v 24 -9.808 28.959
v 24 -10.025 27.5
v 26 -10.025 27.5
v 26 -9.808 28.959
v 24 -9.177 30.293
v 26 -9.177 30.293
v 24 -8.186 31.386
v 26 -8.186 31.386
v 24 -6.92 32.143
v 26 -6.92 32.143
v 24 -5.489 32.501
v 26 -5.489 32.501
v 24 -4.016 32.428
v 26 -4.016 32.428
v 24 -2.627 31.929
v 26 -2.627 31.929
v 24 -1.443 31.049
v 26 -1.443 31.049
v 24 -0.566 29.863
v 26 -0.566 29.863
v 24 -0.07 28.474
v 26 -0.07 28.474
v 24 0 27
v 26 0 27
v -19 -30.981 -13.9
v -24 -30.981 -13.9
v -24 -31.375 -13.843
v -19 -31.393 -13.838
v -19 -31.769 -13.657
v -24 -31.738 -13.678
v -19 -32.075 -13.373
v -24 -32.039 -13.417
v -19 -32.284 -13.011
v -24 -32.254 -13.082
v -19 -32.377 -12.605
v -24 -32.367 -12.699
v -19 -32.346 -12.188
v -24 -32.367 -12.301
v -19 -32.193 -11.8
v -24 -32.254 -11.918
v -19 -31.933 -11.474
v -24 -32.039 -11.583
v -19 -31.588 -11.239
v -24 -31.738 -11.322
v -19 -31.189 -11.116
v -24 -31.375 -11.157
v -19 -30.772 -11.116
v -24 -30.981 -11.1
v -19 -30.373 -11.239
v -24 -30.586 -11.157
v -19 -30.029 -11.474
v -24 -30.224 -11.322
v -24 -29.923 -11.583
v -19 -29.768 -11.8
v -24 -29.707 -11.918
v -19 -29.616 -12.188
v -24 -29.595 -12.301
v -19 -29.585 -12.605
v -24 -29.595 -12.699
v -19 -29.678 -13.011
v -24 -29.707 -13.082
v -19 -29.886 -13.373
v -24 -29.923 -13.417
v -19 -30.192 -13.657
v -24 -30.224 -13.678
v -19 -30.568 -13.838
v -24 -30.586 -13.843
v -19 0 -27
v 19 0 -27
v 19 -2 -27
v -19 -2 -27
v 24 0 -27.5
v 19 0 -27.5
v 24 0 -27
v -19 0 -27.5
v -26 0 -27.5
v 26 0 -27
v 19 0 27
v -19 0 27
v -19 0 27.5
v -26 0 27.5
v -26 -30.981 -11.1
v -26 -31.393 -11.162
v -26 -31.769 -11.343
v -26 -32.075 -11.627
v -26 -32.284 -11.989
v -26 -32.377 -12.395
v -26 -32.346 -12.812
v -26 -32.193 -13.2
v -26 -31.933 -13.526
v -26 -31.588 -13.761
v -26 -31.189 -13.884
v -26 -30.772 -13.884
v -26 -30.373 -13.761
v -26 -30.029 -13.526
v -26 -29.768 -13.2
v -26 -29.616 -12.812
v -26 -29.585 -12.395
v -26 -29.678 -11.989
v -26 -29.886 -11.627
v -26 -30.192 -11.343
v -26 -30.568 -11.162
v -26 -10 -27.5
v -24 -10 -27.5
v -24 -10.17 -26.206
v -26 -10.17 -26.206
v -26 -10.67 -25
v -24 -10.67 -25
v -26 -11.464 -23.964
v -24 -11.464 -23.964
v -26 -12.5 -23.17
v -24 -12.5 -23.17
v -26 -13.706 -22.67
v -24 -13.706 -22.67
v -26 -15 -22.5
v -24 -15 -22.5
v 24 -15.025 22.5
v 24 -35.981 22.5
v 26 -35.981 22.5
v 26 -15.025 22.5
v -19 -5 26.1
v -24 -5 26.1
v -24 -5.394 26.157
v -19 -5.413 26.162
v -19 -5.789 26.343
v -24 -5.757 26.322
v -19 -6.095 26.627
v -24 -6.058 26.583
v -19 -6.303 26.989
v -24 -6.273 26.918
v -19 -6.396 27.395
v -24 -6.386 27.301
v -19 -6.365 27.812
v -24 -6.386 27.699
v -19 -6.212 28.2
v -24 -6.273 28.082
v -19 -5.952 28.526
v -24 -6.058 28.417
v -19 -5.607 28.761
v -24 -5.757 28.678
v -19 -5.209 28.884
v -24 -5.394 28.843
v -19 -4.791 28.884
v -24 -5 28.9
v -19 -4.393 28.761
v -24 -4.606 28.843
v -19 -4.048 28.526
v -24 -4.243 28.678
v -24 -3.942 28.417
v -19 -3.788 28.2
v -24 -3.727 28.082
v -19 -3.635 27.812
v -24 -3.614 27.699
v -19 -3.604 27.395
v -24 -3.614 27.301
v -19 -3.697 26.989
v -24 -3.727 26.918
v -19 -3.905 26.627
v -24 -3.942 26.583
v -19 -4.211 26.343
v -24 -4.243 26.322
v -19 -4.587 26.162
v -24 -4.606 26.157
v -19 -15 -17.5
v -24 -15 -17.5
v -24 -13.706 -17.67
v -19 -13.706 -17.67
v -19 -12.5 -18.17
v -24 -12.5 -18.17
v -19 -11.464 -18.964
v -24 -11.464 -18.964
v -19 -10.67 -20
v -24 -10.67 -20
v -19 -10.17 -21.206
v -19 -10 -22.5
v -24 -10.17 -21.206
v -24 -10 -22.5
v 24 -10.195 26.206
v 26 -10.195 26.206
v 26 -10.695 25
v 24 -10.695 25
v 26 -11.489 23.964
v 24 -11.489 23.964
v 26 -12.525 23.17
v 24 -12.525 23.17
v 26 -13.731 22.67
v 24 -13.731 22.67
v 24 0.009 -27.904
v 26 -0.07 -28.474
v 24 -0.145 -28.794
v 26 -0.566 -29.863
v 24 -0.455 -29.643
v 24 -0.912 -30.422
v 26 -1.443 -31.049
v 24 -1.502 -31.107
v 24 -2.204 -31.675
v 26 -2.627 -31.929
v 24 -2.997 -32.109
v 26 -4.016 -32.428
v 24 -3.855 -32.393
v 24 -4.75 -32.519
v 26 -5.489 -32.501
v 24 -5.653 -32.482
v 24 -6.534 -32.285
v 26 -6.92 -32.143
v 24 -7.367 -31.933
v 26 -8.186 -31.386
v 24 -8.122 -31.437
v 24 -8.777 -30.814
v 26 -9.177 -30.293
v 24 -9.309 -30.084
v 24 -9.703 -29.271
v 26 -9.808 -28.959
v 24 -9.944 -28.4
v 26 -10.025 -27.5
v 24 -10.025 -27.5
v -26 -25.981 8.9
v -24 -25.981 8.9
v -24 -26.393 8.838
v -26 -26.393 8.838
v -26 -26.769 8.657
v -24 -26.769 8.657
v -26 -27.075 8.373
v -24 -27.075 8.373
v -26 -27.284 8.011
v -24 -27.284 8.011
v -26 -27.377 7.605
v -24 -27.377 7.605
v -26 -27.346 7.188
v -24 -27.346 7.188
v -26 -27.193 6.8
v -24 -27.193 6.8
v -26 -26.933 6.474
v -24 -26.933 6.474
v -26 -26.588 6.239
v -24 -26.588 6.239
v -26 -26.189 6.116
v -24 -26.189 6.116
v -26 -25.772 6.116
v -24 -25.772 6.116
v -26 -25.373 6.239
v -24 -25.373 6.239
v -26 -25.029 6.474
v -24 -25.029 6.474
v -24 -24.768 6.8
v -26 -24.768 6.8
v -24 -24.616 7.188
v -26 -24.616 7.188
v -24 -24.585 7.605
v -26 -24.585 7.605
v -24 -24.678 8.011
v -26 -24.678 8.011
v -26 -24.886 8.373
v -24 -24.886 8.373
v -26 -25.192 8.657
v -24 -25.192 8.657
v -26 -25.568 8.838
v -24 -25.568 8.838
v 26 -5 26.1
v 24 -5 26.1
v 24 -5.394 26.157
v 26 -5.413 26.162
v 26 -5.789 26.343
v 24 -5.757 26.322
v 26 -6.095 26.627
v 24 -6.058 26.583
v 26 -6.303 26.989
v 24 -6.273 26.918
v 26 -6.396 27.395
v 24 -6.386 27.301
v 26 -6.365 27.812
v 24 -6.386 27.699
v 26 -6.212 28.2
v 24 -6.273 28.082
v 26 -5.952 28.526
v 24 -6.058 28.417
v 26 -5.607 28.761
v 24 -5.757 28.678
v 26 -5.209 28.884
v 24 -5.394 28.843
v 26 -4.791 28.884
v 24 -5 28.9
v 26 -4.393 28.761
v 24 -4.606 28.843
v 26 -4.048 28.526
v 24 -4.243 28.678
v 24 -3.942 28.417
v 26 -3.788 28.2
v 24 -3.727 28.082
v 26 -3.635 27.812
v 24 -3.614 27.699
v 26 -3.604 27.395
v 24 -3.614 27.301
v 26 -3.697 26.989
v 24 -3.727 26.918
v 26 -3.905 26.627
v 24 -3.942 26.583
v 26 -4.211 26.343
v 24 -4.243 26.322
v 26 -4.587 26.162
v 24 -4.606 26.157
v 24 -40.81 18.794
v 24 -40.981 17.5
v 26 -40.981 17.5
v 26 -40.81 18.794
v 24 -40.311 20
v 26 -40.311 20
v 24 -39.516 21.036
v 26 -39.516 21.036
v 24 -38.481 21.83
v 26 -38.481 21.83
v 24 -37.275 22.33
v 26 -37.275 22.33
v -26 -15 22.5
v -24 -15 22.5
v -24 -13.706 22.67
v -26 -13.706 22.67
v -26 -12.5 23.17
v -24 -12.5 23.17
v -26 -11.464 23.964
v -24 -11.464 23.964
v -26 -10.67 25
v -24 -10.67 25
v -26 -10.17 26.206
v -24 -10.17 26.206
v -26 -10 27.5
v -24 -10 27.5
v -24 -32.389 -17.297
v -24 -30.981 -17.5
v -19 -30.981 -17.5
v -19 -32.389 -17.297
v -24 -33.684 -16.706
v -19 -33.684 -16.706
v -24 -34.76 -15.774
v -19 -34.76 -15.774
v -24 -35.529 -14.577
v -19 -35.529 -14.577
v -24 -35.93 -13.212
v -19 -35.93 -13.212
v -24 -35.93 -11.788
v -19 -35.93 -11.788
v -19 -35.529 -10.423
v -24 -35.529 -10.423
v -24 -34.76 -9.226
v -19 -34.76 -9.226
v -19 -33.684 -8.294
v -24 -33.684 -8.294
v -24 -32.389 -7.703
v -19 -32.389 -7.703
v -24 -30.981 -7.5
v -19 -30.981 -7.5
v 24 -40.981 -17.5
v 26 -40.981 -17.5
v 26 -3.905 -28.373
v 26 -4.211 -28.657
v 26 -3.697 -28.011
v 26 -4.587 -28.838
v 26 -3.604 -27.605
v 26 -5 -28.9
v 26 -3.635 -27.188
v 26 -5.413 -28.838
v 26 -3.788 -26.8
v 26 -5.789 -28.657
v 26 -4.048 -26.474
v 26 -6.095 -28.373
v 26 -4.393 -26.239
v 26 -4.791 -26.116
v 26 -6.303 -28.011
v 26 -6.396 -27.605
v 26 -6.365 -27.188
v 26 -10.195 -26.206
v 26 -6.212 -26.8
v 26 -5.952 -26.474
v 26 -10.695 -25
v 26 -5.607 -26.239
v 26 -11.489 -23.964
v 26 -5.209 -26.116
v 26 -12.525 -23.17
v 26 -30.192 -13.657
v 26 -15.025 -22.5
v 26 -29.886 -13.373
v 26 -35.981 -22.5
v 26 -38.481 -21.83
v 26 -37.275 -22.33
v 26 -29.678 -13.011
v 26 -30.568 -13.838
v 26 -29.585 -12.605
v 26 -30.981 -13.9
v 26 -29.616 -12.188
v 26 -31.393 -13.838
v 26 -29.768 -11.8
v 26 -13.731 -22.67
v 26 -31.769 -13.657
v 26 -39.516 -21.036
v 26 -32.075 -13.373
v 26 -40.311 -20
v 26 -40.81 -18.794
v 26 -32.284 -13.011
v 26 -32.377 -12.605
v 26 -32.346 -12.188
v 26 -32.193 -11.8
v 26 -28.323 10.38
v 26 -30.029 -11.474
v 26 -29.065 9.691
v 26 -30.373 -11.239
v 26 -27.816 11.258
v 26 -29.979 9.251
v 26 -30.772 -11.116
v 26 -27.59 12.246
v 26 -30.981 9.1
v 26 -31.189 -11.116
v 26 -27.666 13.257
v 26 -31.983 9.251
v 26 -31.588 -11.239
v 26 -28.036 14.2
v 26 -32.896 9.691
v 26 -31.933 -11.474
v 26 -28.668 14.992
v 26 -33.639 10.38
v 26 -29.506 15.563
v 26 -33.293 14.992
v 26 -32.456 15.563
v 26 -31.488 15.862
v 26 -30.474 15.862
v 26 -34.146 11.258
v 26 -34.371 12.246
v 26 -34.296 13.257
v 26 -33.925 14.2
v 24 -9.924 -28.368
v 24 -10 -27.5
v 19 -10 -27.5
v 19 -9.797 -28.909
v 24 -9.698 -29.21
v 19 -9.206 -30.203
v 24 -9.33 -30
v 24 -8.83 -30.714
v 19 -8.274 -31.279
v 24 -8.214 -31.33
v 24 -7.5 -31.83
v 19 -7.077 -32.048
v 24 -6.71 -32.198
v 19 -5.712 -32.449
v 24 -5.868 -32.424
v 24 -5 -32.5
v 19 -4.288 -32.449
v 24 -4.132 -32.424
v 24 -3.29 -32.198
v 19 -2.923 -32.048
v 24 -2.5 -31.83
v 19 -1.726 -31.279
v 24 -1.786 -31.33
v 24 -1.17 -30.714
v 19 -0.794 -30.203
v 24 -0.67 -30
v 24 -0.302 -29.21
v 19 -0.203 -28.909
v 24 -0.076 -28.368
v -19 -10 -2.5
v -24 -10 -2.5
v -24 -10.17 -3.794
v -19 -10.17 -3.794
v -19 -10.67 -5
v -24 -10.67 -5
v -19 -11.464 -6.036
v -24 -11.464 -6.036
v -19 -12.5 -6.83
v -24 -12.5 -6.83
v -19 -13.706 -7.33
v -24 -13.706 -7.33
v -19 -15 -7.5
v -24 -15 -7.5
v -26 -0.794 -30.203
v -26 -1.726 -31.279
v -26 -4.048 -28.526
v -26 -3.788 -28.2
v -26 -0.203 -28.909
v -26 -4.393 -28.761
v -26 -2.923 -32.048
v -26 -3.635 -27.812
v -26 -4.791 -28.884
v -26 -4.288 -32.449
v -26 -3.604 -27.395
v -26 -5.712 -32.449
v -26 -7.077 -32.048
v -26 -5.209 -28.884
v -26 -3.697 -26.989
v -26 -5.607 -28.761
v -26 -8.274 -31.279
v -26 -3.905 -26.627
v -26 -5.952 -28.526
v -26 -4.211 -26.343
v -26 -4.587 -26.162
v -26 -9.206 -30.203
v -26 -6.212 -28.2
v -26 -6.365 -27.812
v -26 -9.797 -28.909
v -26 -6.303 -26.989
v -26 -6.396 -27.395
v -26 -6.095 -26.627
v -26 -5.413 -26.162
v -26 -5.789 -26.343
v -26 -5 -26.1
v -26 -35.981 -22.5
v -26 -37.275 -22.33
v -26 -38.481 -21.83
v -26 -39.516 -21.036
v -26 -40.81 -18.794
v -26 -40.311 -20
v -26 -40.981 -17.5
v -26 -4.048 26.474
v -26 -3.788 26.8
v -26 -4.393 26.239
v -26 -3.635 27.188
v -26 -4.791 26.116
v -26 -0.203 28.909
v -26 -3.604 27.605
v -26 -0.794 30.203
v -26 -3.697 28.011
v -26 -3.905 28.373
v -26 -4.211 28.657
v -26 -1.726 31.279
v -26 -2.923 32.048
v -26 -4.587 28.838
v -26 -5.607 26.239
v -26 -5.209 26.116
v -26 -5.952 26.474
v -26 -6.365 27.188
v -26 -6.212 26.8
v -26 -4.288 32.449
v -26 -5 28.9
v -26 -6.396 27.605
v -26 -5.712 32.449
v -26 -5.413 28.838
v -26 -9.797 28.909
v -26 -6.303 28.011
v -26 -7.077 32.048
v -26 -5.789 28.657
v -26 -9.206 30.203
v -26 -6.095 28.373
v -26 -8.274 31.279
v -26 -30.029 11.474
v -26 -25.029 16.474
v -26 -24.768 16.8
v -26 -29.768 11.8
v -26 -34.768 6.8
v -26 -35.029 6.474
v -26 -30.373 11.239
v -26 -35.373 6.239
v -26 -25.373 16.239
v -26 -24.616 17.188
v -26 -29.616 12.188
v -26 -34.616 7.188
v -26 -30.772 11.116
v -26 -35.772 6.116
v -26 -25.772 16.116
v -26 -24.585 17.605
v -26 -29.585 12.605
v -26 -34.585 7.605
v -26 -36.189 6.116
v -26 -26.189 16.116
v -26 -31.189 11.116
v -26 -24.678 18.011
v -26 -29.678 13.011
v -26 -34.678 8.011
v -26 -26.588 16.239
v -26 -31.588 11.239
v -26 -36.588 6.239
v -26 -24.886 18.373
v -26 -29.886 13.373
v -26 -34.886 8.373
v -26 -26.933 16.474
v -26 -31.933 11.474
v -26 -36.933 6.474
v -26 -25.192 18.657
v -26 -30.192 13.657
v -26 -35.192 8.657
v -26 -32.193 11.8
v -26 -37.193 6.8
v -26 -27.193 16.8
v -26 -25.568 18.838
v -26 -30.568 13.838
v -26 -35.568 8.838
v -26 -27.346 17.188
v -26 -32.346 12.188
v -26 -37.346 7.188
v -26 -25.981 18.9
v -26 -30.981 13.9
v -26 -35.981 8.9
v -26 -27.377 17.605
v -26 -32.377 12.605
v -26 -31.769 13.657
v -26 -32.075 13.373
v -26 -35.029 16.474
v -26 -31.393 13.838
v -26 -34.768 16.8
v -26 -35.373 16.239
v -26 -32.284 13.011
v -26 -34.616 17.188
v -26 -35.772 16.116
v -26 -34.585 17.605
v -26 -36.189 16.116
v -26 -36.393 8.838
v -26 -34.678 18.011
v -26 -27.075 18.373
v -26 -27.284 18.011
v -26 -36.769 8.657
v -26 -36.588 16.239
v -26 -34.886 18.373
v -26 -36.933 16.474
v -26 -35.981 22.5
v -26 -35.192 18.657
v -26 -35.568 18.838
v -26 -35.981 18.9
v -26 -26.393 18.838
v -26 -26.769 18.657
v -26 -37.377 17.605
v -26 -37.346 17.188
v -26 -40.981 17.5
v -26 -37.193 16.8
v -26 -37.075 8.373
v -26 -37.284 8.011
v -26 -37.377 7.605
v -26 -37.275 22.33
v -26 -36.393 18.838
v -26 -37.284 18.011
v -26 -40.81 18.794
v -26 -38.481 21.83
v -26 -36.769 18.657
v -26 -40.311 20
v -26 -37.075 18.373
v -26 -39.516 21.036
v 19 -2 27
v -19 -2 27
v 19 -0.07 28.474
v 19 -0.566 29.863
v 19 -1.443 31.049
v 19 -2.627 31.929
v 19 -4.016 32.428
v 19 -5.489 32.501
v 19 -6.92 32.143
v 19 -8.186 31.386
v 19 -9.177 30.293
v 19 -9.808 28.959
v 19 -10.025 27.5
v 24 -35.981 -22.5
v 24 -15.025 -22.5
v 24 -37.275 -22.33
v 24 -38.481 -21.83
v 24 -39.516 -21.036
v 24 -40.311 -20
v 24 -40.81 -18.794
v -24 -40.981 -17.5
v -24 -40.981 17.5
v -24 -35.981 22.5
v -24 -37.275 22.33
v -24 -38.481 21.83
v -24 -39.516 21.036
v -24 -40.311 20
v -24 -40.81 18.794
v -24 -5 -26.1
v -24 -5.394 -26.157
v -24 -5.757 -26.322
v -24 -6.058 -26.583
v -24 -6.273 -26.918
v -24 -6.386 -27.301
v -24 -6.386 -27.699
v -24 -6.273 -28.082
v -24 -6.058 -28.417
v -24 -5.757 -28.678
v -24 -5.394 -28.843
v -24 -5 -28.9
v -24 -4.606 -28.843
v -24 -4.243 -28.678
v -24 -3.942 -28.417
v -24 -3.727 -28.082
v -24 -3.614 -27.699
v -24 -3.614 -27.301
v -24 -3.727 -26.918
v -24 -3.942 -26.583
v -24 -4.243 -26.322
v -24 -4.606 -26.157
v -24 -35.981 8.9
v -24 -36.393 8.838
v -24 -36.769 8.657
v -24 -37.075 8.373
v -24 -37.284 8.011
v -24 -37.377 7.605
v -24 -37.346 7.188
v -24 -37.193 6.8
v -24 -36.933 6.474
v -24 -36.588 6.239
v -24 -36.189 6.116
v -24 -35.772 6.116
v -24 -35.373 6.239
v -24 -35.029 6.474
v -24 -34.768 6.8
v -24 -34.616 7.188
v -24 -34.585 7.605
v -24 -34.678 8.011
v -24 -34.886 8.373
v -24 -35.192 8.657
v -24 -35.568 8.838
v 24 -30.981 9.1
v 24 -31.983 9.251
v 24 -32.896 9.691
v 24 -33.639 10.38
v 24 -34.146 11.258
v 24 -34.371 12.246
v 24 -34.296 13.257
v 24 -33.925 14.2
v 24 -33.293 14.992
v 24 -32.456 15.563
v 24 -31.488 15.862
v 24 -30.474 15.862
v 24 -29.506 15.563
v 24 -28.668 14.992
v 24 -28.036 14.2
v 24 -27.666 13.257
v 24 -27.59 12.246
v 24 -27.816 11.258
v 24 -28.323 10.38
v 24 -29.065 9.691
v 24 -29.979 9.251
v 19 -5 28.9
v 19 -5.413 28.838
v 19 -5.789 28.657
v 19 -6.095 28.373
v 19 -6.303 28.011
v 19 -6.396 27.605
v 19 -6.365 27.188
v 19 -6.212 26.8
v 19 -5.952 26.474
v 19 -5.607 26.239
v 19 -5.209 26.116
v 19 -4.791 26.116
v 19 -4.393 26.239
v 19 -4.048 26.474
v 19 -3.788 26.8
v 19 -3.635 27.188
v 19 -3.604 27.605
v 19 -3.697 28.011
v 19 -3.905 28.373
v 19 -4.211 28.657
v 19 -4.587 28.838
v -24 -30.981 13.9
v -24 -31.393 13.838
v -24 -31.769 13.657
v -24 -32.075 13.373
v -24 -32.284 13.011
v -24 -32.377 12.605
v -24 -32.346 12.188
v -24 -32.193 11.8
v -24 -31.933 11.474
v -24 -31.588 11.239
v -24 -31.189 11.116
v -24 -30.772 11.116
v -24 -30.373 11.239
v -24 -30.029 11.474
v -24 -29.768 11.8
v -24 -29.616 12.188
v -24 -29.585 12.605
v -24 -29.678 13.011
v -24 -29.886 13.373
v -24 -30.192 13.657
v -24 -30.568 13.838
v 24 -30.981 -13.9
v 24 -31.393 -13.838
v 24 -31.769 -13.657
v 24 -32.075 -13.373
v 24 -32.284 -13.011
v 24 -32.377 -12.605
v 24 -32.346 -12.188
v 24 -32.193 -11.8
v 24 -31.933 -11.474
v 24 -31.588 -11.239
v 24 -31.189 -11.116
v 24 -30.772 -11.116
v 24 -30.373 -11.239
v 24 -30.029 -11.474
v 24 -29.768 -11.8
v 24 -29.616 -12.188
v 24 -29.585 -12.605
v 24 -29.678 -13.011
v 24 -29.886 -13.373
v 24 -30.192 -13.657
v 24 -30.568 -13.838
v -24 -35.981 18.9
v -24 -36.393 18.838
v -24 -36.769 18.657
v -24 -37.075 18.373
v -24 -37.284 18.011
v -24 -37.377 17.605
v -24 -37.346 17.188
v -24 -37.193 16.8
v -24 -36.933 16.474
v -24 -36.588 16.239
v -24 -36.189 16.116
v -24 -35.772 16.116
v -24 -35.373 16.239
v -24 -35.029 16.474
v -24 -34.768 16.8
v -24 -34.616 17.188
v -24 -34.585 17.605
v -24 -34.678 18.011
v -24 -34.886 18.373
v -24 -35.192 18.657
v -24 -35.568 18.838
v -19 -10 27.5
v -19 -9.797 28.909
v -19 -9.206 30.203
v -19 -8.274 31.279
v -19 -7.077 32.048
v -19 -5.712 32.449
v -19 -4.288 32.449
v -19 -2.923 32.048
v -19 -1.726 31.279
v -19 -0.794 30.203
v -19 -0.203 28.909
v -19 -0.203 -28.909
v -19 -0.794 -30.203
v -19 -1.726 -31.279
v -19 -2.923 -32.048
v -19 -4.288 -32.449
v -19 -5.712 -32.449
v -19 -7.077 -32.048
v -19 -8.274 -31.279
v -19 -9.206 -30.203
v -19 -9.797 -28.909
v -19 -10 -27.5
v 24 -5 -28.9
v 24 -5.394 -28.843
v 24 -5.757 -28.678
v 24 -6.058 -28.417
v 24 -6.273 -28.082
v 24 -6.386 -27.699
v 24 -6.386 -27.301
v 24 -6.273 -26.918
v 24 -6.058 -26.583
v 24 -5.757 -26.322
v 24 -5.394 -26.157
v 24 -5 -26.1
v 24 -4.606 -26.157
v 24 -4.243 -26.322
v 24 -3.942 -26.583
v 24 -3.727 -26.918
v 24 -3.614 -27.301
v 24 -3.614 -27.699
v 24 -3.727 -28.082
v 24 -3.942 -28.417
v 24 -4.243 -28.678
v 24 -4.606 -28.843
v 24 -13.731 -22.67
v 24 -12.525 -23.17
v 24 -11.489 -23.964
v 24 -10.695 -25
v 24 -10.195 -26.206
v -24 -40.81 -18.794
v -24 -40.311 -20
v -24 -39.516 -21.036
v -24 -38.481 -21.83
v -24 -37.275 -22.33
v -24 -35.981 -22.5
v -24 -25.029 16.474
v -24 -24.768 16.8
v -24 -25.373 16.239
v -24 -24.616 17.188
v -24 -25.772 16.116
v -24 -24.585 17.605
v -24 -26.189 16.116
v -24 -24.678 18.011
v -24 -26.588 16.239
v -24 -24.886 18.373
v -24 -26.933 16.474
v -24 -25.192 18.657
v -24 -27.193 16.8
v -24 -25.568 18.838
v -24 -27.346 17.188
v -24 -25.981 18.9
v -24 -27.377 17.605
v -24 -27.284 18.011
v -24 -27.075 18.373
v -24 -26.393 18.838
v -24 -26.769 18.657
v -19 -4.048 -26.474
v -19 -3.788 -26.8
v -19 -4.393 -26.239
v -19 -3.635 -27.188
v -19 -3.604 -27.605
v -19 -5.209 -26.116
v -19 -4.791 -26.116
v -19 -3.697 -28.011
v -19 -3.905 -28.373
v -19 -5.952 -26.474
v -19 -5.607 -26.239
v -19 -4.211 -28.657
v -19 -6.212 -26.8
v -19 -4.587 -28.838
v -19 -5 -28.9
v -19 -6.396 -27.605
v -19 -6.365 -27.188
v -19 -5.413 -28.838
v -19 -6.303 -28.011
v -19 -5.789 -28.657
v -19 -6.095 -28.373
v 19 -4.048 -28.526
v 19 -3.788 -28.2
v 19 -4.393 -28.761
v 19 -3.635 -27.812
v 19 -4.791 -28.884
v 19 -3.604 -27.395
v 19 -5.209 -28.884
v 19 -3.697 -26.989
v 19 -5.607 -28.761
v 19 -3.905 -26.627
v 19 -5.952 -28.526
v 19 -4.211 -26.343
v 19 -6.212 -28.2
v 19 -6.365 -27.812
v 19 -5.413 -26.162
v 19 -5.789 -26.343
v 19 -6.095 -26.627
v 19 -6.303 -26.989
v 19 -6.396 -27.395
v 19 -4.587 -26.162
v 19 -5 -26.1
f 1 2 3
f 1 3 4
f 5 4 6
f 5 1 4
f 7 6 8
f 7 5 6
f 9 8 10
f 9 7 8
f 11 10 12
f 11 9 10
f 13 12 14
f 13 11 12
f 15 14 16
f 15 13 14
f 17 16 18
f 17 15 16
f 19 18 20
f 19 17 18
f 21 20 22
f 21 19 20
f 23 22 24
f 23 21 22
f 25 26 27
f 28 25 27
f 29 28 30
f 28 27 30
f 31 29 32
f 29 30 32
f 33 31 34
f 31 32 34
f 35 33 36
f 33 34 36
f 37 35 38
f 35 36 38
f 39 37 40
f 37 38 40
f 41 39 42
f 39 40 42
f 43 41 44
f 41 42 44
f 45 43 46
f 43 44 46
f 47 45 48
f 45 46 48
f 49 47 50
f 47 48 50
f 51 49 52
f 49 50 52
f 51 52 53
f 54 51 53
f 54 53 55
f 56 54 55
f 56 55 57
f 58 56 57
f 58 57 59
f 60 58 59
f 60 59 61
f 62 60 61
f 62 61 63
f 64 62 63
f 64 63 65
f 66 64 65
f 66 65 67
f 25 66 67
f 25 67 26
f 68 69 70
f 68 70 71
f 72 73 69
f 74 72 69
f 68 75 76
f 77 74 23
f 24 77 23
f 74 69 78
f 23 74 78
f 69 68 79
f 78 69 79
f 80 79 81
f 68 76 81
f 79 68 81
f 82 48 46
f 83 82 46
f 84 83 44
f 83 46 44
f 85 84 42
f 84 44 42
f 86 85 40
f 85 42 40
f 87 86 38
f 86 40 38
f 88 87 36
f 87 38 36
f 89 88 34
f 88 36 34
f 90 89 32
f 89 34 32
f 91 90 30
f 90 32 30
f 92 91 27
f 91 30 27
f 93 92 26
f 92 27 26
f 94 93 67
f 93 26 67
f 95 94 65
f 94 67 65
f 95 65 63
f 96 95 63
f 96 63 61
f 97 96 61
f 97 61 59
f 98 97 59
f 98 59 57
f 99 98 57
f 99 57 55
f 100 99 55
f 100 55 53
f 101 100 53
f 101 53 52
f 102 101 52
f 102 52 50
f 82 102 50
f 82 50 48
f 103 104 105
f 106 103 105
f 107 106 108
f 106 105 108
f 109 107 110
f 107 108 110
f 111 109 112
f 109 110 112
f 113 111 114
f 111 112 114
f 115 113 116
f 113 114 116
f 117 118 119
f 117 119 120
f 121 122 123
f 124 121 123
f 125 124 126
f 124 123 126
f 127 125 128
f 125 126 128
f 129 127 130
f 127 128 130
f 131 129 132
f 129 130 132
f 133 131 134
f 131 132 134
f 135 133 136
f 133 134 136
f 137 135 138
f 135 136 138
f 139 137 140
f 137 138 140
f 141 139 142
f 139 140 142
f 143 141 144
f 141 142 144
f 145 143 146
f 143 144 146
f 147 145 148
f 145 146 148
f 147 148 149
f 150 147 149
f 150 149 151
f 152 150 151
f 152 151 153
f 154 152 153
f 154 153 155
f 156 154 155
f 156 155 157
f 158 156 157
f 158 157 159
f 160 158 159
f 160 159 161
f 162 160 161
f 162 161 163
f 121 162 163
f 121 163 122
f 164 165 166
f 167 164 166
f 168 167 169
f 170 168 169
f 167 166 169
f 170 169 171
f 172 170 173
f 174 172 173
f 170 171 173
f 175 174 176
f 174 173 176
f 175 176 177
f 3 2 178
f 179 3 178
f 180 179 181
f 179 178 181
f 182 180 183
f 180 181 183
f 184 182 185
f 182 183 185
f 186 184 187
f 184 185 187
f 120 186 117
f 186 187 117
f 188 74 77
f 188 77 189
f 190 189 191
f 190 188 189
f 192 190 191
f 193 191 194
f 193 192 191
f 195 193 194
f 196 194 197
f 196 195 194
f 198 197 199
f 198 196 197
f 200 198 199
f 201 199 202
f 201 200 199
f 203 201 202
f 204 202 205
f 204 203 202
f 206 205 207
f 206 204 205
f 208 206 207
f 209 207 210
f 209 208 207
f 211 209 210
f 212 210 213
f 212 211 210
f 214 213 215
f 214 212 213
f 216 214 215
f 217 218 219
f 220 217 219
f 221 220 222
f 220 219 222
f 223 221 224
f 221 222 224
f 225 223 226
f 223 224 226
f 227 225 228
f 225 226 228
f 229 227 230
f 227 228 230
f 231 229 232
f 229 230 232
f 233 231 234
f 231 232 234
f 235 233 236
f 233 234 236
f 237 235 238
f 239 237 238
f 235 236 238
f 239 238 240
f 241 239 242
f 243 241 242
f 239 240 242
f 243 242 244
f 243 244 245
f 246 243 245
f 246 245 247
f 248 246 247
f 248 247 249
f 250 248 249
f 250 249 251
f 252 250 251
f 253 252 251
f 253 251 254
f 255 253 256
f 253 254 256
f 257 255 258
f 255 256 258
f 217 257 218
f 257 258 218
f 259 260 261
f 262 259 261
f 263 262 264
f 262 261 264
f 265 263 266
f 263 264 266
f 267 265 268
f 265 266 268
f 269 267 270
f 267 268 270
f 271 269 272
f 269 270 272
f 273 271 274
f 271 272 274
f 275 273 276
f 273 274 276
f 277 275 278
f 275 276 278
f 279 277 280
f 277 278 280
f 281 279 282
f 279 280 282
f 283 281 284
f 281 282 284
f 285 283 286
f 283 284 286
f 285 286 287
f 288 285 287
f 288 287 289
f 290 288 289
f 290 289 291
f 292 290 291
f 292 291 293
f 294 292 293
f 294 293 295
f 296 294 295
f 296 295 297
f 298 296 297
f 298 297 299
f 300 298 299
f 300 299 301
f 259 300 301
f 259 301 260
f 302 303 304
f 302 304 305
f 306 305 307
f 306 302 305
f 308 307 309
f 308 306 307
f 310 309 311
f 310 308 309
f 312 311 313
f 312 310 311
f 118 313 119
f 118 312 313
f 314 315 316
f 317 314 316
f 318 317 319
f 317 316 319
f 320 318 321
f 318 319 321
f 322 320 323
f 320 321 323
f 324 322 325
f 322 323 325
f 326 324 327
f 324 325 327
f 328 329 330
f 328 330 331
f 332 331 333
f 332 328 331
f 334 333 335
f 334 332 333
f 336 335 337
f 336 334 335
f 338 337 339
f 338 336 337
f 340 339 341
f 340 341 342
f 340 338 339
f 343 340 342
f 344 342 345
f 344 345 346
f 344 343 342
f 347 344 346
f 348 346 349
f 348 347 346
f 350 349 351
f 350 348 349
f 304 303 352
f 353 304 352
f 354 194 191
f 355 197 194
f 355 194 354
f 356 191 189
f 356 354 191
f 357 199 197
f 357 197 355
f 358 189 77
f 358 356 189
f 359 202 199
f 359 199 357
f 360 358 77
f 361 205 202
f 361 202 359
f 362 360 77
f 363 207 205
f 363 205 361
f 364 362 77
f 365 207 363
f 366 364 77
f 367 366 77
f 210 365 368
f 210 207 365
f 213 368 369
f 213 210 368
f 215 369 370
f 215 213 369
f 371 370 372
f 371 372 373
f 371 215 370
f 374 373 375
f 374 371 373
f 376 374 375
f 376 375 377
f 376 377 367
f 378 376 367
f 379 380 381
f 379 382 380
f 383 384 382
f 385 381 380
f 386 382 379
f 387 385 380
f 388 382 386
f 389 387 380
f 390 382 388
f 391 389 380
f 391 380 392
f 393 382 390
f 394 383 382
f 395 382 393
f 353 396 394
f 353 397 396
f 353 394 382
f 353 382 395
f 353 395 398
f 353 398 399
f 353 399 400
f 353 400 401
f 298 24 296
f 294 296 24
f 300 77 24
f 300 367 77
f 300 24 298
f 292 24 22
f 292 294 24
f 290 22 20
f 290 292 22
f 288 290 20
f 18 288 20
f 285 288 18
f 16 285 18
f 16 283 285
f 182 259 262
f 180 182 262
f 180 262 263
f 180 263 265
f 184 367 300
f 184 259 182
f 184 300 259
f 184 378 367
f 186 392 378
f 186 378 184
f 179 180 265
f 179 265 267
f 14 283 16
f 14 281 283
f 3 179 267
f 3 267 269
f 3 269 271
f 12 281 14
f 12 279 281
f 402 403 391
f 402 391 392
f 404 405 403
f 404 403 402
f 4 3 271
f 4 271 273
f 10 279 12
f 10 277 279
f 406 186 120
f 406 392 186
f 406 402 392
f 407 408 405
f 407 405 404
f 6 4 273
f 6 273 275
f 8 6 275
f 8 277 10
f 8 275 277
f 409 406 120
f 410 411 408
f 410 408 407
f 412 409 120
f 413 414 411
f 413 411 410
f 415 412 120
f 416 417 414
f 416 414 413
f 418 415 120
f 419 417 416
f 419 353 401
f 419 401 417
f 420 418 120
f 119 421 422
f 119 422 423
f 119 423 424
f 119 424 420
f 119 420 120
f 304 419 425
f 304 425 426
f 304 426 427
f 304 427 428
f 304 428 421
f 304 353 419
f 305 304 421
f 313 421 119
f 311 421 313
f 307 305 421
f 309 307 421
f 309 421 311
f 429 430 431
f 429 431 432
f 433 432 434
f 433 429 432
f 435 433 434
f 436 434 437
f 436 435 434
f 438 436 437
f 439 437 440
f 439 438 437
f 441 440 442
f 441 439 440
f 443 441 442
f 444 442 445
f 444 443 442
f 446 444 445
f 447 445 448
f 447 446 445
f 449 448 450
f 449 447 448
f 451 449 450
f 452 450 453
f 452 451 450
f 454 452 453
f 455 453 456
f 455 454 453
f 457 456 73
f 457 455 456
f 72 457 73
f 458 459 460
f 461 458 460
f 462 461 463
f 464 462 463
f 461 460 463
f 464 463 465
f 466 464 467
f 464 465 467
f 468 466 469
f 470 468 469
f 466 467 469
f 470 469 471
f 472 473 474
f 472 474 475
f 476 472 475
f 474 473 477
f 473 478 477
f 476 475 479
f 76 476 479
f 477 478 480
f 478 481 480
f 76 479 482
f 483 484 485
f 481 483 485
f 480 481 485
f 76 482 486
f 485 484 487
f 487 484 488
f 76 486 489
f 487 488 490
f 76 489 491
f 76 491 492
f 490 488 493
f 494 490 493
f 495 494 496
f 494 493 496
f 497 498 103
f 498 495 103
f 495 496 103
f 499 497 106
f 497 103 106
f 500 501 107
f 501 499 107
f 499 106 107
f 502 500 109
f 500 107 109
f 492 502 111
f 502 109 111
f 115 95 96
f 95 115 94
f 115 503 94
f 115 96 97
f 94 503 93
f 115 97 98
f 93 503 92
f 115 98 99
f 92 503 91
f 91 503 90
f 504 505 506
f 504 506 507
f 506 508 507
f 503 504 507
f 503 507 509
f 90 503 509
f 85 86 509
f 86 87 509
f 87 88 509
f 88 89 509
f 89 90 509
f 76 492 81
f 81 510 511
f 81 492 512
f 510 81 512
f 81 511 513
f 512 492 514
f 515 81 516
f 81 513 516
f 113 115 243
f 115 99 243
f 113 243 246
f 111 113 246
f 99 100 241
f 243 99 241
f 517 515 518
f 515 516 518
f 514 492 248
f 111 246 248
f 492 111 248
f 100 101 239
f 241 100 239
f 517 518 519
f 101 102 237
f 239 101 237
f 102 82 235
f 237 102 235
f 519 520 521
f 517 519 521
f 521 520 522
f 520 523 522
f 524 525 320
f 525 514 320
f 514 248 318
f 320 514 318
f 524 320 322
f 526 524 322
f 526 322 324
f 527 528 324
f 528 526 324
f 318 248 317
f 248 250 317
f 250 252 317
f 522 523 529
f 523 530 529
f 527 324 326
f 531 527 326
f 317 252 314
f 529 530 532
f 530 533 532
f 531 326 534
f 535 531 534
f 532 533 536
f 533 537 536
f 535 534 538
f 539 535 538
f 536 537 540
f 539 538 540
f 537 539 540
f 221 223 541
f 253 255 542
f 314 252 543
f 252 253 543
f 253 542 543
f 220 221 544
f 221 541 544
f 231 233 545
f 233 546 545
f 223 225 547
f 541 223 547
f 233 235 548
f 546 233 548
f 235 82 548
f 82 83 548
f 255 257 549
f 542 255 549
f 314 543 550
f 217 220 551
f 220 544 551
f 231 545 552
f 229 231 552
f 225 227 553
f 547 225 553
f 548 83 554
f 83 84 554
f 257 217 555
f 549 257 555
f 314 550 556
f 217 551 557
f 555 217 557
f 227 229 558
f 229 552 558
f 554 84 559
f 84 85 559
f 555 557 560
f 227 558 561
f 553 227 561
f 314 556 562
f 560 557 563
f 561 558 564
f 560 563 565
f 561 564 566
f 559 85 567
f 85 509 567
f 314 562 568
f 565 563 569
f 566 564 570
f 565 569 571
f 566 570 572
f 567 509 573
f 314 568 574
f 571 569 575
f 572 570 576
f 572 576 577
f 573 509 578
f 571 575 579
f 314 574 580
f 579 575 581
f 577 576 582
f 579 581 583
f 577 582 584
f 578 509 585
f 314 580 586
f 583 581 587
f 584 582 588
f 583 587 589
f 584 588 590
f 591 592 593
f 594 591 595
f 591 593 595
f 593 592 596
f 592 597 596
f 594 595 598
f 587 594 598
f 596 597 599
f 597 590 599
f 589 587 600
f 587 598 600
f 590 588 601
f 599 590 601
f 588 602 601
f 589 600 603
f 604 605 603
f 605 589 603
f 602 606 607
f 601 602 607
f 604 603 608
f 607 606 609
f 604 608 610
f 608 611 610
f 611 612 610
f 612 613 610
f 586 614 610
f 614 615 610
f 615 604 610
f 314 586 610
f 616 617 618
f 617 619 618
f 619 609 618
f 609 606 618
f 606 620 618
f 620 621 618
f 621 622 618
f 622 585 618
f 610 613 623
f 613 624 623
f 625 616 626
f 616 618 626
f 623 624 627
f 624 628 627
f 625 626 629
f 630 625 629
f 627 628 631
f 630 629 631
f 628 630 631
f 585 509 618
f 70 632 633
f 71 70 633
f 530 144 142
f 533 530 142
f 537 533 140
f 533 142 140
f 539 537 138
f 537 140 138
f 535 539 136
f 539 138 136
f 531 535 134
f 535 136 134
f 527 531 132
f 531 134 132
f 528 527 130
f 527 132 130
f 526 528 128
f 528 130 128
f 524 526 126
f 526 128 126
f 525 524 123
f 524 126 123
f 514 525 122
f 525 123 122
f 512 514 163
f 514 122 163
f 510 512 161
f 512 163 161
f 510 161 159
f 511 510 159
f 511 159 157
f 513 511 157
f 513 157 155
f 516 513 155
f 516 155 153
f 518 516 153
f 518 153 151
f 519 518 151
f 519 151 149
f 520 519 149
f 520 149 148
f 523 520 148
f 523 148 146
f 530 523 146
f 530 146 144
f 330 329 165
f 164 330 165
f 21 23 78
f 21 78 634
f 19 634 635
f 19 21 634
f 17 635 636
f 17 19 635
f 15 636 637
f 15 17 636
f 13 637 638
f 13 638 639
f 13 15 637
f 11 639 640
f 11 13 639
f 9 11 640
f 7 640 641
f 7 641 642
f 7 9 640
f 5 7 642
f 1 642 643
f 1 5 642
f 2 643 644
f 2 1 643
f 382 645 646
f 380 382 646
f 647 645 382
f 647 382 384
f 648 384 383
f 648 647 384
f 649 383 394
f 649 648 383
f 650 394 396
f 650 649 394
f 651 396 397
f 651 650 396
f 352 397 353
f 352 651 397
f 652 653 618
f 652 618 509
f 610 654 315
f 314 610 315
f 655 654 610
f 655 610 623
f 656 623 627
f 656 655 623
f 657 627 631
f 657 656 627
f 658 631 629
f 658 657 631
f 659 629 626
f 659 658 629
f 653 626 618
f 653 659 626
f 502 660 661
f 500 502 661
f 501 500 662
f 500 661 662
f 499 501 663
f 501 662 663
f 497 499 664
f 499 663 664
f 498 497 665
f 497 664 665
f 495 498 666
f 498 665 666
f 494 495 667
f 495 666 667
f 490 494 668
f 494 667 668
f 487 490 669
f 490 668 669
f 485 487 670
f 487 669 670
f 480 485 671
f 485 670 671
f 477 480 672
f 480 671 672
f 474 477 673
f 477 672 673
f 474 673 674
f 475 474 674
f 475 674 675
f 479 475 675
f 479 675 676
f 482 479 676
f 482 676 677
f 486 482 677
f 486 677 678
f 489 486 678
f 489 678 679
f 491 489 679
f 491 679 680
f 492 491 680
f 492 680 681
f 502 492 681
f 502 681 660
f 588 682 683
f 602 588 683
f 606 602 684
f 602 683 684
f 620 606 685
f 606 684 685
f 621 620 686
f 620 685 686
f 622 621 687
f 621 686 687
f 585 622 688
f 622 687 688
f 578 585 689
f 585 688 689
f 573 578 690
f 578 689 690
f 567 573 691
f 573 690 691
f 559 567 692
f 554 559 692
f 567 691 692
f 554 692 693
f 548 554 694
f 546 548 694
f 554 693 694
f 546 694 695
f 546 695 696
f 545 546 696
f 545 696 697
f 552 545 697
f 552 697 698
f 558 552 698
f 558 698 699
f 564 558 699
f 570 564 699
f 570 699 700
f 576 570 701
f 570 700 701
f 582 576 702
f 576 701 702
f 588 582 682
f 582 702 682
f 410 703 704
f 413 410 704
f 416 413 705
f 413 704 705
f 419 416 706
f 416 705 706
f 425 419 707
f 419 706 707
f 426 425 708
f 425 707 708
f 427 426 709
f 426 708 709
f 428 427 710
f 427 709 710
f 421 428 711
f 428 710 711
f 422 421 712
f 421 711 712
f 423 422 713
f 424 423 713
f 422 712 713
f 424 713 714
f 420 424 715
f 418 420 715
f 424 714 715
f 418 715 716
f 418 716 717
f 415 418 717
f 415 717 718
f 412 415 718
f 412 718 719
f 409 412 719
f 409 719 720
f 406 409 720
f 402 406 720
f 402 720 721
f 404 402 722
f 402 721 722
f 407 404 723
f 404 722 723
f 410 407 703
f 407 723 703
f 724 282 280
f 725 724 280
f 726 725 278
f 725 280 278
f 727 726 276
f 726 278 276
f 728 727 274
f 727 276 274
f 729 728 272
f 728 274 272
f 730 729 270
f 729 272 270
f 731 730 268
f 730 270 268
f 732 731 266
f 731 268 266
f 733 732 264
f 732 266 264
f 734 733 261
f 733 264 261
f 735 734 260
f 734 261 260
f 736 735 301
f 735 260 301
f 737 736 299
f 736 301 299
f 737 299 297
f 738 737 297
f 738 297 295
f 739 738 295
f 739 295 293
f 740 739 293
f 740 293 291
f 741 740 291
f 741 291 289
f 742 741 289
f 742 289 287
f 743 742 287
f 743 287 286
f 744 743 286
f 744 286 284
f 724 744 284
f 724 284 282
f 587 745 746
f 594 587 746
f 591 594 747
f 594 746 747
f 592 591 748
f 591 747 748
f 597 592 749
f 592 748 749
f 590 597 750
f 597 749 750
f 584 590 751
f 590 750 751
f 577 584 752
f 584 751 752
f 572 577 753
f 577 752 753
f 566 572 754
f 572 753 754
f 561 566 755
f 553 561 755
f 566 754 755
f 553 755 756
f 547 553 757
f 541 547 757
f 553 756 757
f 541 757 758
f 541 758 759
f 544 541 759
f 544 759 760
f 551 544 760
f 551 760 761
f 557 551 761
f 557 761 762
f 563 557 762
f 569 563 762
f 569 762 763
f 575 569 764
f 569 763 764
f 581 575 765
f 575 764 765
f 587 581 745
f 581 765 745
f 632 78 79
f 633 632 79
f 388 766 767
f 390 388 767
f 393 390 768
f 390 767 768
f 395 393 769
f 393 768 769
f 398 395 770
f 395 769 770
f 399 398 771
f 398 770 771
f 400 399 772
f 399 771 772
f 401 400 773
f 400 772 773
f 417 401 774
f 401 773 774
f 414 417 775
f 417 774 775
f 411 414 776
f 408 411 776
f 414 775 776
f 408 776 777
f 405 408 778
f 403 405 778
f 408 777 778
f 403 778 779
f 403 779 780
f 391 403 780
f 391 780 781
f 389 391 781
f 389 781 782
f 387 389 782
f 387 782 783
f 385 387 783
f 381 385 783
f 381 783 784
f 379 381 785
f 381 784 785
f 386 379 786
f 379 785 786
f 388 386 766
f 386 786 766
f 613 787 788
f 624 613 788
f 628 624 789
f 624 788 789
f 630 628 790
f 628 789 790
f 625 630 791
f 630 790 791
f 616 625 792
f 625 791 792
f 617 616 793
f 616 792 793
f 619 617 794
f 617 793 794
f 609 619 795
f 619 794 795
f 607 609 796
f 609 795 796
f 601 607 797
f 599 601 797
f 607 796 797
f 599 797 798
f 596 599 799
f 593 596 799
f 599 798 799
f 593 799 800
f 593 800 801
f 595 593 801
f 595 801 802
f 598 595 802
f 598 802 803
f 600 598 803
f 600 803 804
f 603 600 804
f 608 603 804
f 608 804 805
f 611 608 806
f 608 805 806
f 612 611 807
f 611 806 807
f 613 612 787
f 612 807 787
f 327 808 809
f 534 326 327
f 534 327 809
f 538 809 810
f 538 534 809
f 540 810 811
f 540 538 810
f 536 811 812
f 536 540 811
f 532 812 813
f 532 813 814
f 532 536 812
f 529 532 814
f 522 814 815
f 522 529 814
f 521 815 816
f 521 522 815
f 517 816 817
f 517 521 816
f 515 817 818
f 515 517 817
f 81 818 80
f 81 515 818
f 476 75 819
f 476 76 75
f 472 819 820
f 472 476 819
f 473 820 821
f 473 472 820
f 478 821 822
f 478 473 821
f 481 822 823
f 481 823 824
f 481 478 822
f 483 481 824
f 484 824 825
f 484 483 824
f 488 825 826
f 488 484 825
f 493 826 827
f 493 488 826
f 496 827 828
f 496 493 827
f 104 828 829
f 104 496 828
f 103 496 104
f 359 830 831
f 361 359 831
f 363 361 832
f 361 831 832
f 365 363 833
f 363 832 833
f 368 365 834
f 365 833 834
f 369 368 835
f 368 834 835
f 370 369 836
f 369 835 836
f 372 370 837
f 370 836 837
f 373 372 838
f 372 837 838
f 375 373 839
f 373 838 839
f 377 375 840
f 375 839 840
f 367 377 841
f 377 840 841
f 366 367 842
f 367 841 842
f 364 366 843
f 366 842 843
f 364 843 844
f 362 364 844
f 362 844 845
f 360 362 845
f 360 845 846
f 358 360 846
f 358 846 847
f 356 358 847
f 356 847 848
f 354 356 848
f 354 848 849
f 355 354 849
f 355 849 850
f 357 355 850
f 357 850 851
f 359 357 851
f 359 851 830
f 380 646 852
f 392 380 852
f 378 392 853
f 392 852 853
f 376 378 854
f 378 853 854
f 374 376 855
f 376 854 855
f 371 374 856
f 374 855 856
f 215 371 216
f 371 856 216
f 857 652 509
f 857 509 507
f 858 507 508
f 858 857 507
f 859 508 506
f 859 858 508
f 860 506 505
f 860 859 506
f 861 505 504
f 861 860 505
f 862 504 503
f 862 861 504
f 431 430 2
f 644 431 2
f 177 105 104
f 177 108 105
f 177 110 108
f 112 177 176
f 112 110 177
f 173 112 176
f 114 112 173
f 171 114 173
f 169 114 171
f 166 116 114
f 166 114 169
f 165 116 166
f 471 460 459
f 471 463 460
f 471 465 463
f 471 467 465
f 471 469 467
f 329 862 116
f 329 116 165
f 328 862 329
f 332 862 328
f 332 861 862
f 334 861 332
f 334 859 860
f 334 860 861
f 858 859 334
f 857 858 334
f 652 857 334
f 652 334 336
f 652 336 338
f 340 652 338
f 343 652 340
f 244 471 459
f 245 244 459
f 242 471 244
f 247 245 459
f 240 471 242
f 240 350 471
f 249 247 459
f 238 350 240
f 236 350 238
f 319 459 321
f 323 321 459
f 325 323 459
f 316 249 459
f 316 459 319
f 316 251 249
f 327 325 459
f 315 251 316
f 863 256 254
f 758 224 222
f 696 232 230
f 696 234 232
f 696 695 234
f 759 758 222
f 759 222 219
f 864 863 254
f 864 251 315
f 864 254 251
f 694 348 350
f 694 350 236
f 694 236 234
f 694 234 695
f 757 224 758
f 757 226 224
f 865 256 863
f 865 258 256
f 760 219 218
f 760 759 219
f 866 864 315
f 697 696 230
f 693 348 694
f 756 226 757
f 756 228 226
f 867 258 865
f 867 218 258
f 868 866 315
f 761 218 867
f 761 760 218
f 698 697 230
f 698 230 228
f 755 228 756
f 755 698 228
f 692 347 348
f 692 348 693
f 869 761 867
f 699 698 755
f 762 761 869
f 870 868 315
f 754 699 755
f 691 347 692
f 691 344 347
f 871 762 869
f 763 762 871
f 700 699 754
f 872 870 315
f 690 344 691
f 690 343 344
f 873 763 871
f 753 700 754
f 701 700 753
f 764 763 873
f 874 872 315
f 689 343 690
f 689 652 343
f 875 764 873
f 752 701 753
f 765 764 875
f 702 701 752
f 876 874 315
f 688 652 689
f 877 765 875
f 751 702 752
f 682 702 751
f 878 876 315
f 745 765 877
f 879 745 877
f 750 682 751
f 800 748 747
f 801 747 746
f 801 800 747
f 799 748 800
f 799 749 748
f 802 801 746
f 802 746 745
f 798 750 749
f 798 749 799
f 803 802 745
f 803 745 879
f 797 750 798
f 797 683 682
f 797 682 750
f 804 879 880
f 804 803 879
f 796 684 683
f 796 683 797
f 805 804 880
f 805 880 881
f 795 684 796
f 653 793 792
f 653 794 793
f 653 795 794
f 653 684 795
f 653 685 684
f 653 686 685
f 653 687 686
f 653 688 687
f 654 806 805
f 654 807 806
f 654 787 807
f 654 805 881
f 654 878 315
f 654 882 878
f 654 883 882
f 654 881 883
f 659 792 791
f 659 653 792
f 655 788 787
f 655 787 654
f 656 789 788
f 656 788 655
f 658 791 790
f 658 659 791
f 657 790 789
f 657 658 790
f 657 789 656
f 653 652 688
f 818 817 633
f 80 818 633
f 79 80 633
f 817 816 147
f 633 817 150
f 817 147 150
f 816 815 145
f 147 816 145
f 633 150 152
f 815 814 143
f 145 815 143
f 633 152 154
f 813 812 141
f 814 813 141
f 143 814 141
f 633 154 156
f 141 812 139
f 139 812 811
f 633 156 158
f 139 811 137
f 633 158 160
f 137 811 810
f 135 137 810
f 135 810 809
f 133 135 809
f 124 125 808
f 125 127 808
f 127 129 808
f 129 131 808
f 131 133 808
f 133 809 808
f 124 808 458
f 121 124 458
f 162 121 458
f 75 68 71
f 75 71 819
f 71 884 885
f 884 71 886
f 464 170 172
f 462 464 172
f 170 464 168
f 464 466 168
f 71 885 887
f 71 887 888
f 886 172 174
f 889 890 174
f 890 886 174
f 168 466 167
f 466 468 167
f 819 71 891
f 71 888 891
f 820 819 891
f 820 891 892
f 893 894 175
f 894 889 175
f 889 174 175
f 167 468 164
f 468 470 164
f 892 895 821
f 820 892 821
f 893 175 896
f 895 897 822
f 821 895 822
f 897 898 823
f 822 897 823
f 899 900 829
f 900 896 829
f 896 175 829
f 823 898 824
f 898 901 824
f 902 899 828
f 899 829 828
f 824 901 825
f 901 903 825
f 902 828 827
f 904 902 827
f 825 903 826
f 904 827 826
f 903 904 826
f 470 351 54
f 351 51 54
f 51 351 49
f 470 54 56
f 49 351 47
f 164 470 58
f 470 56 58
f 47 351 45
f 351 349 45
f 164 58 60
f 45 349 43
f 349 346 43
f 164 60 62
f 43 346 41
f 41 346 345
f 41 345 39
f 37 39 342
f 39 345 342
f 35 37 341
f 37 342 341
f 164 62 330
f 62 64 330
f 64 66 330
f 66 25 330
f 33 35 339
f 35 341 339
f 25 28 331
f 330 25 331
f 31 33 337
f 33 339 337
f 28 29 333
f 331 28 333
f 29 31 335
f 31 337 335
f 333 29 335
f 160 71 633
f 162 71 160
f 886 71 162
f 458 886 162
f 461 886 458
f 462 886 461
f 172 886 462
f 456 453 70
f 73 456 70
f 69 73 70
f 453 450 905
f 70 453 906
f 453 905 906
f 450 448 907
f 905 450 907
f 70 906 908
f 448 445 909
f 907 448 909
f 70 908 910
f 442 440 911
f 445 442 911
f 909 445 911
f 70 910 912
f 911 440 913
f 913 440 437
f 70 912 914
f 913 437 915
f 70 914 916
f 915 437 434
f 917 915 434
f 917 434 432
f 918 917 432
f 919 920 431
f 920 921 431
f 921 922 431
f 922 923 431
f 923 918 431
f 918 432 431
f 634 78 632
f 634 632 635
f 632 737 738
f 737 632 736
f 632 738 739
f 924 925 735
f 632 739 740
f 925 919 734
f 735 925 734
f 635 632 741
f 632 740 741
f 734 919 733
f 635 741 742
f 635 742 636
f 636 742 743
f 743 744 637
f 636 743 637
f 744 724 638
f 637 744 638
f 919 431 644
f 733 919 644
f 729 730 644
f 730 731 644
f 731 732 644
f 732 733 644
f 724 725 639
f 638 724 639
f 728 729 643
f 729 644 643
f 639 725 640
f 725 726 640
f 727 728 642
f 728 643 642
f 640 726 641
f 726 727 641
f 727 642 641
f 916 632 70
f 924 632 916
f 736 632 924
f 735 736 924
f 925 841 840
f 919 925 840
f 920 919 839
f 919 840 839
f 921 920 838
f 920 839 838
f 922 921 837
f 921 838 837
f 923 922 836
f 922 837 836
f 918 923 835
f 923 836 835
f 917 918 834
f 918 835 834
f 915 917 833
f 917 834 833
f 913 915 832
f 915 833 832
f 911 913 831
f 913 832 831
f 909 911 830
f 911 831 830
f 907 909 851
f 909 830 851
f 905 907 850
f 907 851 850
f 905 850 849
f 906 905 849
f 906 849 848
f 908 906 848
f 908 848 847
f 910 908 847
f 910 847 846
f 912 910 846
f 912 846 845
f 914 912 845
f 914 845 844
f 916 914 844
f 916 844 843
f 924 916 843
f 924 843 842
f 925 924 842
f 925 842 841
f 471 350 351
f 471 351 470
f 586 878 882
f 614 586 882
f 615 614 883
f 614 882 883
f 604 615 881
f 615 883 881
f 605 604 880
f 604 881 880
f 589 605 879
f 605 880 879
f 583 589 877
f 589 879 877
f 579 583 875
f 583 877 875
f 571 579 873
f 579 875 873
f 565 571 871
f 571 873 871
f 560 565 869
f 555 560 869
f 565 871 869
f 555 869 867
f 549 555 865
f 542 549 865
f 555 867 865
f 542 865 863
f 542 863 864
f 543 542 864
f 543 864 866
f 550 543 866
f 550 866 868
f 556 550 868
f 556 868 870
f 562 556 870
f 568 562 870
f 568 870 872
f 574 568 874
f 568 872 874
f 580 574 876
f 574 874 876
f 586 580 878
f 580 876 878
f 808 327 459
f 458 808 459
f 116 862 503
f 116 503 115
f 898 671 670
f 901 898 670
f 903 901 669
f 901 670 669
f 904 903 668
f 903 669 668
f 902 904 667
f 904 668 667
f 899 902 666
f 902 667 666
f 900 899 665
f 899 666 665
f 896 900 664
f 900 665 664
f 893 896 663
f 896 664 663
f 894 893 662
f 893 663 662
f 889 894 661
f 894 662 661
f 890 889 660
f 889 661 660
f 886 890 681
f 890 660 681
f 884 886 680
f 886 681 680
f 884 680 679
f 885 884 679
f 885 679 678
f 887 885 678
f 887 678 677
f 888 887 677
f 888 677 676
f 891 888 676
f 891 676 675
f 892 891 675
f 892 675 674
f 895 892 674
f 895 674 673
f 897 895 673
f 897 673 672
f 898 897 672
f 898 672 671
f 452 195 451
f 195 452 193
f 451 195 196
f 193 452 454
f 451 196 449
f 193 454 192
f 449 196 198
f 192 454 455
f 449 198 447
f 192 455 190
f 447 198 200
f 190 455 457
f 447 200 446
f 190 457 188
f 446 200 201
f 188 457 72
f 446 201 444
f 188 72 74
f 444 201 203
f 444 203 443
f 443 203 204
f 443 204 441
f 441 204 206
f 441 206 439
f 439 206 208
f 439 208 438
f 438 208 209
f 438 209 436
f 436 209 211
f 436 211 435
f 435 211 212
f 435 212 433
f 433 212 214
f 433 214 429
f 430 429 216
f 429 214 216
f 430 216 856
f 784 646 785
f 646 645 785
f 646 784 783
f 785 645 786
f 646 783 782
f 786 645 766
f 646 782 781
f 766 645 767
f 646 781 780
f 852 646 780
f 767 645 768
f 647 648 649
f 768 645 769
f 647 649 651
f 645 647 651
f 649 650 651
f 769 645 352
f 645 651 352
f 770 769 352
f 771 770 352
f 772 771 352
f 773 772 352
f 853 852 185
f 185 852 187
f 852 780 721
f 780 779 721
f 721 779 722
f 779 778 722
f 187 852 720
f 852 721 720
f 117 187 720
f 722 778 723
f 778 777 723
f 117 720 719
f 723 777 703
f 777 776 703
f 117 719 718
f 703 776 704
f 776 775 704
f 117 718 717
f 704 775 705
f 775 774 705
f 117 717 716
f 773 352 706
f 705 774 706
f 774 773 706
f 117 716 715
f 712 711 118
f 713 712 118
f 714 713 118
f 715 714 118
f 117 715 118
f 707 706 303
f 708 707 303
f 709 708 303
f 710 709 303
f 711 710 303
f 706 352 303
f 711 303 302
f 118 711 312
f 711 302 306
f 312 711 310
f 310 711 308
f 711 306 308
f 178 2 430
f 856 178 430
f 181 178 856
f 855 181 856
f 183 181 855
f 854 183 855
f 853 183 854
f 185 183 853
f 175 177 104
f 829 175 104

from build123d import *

# Parameters (mm, degrees)
SKETCH_W      = 48
SKETCH_H      = 54
PAD_DEPTH     = 2
SKETCH001_R   = 1.4
PAD001_DEPTH  = 2
SKETCH002_R   = 3.4
SKETCH002_R_2 = 1.4
PAD002_DEPTH  = 2
SKETCH003_R   = 1.4
PAD003_DEPTH  = 5
SKETCH004_R   = 1.4
PAD004_DEPTH  = 5


with BuildPart() as body:
    # Sketch → Pad (new body)
    with BuildSketch(Plane.XZ):
        Rectangle(SKETCH_W, SKETCH_H)
    extrude(amount=PAD_DEPTH)

    # Sketch001 (on Face2 of Pad) → Pad001 (join)
    with BuildSketch(Plane(origin=(24, 0, 0), x_dir=(0, 0, 1), z_dir=(1, 0, 0))):
        with BuildLine():
            Line((-27.5, 0), (27.5, 0))
            ThreePointArc((27.5, 0), (32.5, 5), (27.5, 10))
            ThreePointArc((22.5, 15), (23.964466, 11.464466), (27.5, 10))
            Line((22.5, 35.980762), (22.5, 15))
            ThreePointArc((22.5, 35.980762), (21.035534, 39.516296), (17.5, 40.980762))
            Line((17.5, 40.980762), (-17.5, 40.980762))
            ThreePointArc((-17.5, 40.980762), (-21.035534, 39.516296), (-22.5, 35.980762))
            Line((-22.5, 35.980762), (-22.5, 15))
            ThreePointArc((-27.5, 10), (-23.964466, 11.464466), (-22.5, 15))
            ThreePointArc((-27.5, 10), (-32.5, 5), (-27.5, 0))
        make_face()
        with Locations((-27.5, 5)):
            Circle(SKETCH001_R, mode=Mode.SUBTRACT)
        with Locations((27.5, 5)):
            Circle(SKETCH001_R, mode=Mode.SUBTRACT)
        with Locations((12.5, 30.980762)):
            Circle(SKETCH001_R, mode=Mode.SUBTRACT)
        with Locations((17.5, 25.980762)):
            Circle(SKETCH001_R, mode=Mode.SUBTRACT)
        with Locations((17.5, 35.980762)):
            Circle(SKETCH001_R, mode=Mode.SUBTRACT)
        with Locations((7.5, 35.980762)):
            Circle(SKETCH001_R, mode=Mode.SUBTRACT)
        with Locations((7.5, 25.980762)):
            Circle(SKETCH001_R, mode=Mode.SUBTRACT)
        with Locations((-12.5, 30.980762)):
            Circle(SKETCH001_R, mode=Mode.SUBTRACT)
    extrude(amount=PAD001_DEPTH)

    # Sketch002 (on Face4 of Pad) → Pad002 (join)
    with BuildSketch(Plane(origin=(-24, 0, 0), x_dir=(0, 0, -1), z_dir=(-1, 0, 0))):
        with BuildLine():
            Line((27, 0), (-27, 0))
            ThreePointArc((-27.5, 10.024938), (-32.518699, 4.749689), (-27, 0))
            ThreePointArc((-27.5, 10.024938), (-23.964466, 11.489404), (-22.5, 15.024938))
            Line((-22.5, 35.980762), (-22.5, 15.024938))
            ThreePointArc((-17.5, 40.980762), (-21.035534, 39.516296), (-22.5, 35.980762))
            Line((-17.5, 40.980762), (17.5, 40.980762))
            ThreePointArc((22.5, 35.980762), (21.035534, 39.516296), (17.5, 40.980762))
            Line((22.5, 35.980762), (22.5, 15.024938))
            ThreePointArc((22.5, 15.024938), (23.964466, 11.489404), (27.5, 10.024938))
            ThreePointArc((27, 0), (32.518699, 4.749689), (27.5, 10.024938))
        make_face()
        with Locations((-12.5, 30.980762)):
            Circle(SKETCH002_R, mode=Mode.SUBTRACT)
        with Locations((12.5, 30.980762)):
            Circle(SKETCH002_R_2, mode=Mode.SUBTRACT)
        with Locations((27.5, 5)):
            Circle(SKETCH002_R_2, mode=Mode.SUBTRACT)
        with Locations((-27.5, 5)):
            Circle(SKETCH002_R_2, mode=Mode.SUBTRACT)
    extrude(amount=PAD002_DEPTH)

    # Sketch003 (on Face26 of Pad002) → Pad003 (join)
    with BuildSketch(Plane(origin=(-24, 0, 0), x_dir=(0, 0, 1), z_dir=(1, 0, 0))):
        with BuildLine():
            ThreePointArc((-27.5, 10), (-32.5, 5), (-27.5, 0))
            Line((27, 0), (-27.5, 0))
            ThreePointArc((27, 0), (32.518699, 4.749689), (27.5, 10.024938))
            Line((-27.5, 10), (27.5, 10.024938))
        make_face()
        with Locations((-27.5, 5)):
            Circle(SKETCH003_R, mode=Mode.SUBTRACT)
        with Locations((27.5, 5)):
            Circle(SKETCH003_R, mode=Mode.SUBTRACT)
    extrude(amount=PAD003_DEPTH)

    # Sketch004 (on Face4 of Pad003) → Pad004 (join)
    with BuildSketch(Plane(origin=(24, 0, 0), x_dir=(0, 0, -1), z_dir=(-1, 0, 0))):
        with BuildLine():
            ThreePointArc((-27.5, 10), (-32.5, 5), (-27.5, 0))
            Line((27.5, 0), (-27.5, 0))
            ThreePointArc((27.5, 0), (32.5, 5), (27.5, 10))
            Line((22.5, 10), (27.5, 10))
            ThreePointArc((17.5, 15), (18.964466, 11.464466), (22.5, 10))
            Line((17.5, 30.980762), (17.5, 15))
            ThreePointArc((17.5, 30.980762), (12.5, 35.980762), (7.5, 30.980762))
            Line((7.5, 30.980762), (7.5, 15))
            ThreePointArc((2.5, 10), (6.035534, 11.464466), (7.5, 15))
            Line((-27.5, 10), (2.5, 10))
        make_face()
        with Locations((-27.5, 5)):
            Circle(SKETCH004_R, mode=Mode.SUBTRACT)
        with Locations((27.5, 5)):
            Circle(SKETCH004_R, mode=Mode.SUBTRACT)
        with Locations((12.5, 30.980762)):
            Circle(SKETCH004_R, mode=Mode.SUBTRACT)
    extrude(amount=PAD004_DEPTH)


with BuildPart() as part_mirroring:
    # Part__Mirroring: instance of Body
    add(body.part.mirror(Plane(origin=(0, 0, 0), x_dir=(0, -1, 0), z_dir=(1, 0, 0))))


solid = part_mirroring.part
